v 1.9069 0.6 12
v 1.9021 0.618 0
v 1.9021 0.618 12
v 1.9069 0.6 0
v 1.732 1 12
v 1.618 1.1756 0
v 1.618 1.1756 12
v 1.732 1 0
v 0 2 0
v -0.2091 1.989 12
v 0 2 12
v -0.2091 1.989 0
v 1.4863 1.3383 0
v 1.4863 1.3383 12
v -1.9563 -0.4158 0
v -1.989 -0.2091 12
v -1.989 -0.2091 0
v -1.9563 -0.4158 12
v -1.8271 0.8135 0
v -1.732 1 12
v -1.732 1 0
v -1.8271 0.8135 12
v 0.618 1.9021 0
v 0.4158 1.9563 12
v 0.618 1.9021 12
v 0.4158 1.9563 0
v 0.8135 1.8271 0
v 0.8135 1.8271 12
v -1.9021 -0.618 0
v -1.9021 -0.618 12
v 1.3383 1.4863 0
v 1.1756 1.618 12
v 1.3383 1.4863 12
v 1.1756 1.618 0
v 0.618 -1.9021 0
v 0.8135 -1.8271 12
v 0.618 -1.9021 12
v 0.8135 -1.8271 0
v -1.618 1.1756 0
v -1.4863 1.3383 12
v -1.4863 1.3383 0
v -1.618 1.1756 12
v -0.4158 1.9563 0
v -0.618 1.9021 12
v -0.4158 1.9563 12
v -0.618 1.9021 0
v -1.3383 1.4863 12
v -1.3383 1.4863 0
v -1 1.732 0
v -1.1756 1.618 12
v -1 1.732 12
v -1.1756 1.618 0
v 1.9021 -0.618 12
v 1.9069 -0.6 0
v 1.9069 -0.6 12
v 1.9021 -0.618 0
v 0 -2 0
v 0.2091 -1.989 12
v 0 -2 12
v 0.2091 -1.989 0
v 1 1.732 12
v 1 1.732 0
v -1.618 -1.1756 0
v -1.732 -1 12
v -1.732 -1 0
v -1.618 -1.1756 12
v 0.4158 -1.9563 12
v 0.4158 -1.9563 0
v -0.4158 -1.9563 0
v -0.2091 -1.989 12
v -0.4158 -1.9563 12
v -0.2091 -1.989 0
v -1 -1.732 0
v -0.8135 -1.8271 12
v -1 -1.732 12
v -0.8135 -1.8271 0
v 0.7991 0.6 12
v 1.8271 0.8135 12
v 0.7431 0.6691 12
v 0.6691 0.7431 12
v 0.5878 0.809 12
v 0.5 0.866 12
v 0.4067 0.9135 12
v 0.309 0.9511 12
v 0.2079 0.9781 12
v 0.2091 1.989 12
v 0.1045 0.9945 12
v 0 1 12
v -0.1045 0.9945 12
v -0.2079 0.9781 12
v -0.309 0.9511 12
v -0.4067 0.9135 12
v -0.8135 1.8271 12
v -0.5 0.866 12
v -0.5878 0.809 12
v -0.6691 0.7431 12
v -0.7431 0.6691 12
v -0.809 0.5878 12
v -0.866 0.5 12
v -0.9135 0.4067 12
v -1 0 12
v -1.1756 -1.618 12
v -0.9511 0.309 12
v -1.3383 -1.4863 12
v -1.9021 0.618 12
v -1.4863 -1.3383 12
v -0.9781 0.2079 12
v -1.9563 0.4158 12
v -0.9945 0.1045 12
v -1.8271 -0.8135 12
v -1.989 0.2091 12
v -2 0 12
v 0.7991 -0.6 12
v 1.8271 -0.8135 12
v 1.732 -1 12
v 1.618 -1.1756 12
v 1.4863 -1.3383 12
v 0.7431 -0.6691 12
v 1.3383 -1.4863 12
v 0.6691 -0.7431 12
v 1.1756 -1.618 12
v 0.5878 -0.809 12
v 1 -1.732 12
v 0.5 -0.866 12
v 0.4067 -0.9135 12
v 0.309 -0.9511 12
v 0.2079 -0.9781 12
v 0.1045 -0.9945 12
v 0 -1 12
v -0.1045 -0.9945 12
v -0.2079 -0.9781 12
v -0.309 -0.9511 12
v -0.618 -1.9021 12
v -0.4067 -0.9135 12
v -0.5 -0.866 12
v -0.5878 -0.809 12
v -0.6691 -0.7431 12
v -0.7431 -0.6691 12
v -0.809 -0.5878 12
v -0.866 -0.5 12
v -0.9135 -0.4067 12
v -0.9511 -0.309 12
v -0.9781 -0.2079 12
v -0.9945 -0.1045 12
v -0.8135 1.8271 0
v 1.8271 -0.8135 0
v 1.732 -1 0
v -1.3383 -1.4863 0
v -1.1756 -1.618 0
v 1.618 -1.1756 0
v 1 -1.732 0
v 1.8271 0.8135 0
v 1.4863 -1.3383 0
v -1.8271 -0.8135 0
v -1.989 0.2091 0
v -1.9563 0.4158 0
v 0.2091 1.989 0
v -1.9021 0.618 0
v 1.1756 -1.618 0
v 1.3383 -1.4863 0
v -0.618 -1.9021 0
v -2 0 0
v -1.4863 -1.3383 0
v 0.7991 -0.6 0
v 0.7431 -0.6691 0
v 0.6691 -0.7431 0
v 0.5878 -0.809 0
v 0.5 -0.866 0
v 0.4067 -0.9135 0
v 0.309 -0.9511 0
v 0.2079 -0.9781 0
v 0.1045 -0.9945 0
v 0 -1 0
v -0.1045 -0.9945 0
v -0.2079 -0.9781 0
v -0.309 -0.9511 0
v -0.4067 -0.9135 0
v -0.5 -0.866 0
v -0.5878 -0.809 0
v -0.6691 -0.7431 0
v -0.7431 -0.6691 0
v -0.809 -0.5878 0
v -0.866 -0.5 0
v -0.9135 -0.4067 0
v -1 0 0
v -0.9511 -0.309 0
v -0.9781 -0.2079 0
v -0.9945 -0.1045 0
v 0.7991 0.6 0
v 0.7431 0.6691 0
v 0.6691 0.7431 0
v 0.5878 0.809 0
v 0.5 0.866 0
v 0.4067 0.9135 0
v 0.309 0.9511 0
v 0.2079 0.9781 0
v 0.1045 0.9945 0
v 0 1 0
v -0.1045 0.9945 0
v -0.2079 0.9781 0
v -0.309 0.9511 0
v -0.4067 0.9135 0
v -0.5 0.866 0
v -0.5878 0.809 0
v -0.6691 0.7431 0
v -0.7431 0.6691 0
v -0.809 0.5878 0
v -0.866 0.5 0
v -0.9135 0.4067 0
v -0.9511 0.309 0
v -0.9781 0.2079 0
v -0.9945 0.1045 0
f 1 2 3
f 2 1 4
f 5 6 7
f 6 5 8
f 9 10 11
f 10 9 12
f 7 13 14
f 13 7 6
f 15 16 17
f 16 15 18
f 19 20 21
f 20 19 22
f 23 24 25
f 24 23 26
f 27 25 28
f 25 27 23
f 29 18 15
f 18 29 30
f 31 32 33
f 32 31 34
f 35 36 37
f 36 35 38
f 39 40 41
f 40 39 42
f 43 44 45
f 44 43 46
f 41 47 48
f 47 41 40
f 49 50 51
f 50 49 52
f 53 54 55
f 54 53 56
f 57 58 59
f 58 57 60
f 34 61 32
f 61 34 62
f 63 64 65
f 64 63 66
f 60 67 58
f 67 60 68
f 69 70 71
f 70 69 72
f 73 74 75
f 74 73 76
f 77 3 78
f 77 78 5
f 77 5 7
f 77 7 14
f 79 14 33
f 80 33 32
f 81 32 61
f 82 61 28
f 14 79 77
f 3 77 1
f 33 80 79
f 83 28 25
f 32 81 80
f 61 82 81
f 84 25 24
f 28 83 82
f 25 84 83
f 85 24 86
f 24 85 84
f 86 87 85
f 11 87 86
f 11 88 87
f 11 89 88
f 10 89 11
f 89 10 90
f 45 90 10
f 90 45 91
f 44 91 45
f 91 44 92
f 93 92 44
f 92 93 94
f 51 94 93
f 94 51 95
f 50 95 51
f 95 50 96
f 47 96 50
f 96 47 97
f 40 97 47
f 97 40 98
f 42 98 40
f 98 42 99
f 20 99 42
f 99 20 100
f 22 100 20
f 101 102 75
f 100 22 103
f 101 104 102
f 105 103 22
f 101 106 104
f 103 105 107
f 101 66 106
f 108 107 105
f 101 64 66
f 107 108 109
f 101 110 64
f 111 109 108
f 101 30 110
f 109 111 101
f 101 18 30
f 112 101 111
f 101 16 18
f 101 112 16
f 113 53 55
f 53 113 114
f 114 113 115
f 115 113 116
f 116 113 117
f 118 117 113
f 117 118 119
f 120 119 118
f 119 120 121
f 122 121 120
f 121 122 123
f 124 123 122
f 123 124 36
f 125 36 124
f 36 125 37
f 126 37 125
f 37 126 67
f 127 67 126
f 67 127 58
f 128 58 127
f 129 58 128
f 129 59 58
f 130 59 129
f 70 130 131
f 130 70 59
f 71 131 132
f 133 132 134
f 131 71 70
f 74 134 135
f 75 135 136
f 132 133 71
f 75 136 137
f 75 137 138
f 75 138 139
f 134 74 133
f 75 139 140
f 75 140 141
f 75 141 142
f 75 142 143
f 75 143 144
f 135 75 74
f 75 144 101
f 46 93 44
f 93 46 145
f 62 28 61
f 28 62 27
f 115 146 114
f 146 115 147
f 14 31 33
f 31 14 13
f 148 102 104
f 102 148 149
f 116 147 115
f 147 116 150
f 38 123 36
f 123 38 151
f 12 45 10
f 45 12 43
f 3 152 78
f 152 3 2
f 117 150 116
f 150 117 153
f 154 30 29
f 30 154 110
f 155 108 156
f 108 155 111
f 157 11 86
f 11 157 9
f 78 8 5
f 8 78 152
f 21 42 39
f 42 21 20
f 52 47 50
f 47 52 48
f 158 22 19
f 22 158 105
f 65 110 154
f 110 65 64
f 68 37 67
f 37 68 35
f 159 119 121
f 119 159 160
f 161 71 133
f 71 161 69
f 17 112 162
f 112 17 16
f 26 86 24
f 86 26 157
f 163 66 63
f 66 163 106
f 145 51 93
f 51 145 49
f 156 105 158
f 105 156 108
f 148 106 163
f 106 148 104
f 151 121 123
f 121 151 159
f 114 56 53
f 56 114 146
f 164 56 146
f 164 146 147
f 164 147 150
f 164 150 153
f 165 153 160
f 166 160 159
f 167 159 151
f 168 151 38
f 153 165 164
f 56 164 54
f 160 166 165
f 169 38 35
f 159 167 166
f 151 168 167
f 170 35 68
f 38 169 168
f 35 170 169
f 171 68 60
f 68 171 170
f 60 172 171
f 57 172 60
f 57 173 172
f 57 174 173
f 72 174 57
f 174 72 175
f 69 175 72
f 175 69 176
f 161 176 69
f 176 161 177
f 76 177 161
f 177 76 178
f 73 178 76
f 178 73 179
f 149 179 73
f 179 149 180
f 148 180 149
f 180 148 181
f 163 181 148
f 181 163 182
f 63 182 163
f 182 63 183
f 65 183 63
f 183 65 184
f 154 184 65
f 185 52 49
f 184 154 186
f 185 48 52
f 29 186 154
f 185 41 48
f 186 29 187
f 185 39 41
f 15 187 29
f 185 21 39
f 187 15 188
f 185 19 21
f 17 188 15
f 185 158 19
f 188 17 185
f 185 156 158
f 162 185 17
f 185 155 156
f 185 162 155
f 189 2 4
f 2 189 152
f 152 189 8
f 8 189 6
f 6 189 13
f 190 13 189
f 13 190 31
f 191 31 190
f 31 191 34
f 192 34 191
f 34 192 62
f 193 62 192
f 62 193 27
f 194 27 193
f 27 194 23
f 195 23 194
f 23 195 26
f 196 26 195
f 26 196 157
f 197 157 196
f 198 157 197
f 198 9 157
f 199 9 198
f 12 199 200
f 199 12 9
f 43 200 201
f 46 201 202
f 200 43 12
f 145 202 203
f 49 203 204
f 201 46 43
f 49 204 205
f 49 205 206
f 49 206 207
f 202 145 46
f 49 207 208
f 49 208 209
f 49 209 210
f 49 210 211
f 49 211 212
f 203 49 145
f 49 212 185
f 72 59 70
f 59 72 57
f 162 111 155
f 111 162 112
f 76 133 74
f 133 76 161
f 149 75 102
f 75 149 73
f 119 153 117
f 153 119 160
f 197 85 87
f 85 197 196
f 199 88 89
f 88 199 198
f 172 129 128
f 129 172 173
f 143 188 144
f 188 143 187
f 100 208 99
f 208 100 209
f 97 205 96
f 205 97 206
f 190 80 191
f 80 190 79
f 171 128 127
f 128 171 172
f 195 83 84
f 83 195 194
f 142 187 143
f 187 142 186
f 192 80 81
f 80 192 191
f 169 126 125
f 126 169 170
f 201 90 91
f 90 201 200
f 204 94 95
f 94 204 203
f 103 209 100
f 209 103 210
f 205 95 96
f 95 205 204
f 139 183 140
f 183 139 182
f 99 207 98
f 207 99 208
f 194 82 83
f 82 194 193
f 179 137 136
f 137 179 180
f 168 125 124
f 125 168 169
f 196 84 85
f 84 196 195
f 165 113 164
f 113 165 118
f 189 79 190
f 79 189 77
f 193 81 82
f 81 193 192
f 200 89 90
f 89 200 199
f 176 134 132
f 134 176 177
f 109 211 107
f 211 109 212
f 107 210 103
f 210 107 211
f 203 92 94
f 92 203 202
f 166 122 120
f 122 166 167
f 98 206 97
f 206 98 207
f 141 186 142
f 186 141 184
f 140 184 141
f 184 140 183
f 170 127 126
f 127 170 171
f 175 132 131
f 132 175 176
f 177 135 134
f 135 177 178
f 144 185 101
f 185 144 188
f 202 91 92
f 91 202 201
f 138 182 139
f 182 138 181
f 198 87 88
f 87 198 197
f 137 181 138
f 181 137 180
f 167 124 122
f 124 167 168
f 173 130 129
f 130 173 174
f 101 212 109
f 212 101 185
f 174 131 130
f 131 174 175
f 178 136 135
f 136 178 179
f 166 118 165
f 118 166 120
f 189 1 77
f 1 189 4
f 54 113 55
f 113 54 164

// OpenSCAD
// Slotted spring pin sleeve.
$fn = 60;
eps = 0.02;
inner_d = 2;
outer_d = 4;
length = 12;
slot_w = 1.2;
difference() {
    cylinder(d = outer_d, h = length);
    translate([0, 0, -eps]) cylinder(d = inner_d, h = length + 2 * eps);
    translate([0, -slot_w / 2, -eps]) cube([outer_d / 2 + eps, slot_w, length + 2 * eps]);
}
